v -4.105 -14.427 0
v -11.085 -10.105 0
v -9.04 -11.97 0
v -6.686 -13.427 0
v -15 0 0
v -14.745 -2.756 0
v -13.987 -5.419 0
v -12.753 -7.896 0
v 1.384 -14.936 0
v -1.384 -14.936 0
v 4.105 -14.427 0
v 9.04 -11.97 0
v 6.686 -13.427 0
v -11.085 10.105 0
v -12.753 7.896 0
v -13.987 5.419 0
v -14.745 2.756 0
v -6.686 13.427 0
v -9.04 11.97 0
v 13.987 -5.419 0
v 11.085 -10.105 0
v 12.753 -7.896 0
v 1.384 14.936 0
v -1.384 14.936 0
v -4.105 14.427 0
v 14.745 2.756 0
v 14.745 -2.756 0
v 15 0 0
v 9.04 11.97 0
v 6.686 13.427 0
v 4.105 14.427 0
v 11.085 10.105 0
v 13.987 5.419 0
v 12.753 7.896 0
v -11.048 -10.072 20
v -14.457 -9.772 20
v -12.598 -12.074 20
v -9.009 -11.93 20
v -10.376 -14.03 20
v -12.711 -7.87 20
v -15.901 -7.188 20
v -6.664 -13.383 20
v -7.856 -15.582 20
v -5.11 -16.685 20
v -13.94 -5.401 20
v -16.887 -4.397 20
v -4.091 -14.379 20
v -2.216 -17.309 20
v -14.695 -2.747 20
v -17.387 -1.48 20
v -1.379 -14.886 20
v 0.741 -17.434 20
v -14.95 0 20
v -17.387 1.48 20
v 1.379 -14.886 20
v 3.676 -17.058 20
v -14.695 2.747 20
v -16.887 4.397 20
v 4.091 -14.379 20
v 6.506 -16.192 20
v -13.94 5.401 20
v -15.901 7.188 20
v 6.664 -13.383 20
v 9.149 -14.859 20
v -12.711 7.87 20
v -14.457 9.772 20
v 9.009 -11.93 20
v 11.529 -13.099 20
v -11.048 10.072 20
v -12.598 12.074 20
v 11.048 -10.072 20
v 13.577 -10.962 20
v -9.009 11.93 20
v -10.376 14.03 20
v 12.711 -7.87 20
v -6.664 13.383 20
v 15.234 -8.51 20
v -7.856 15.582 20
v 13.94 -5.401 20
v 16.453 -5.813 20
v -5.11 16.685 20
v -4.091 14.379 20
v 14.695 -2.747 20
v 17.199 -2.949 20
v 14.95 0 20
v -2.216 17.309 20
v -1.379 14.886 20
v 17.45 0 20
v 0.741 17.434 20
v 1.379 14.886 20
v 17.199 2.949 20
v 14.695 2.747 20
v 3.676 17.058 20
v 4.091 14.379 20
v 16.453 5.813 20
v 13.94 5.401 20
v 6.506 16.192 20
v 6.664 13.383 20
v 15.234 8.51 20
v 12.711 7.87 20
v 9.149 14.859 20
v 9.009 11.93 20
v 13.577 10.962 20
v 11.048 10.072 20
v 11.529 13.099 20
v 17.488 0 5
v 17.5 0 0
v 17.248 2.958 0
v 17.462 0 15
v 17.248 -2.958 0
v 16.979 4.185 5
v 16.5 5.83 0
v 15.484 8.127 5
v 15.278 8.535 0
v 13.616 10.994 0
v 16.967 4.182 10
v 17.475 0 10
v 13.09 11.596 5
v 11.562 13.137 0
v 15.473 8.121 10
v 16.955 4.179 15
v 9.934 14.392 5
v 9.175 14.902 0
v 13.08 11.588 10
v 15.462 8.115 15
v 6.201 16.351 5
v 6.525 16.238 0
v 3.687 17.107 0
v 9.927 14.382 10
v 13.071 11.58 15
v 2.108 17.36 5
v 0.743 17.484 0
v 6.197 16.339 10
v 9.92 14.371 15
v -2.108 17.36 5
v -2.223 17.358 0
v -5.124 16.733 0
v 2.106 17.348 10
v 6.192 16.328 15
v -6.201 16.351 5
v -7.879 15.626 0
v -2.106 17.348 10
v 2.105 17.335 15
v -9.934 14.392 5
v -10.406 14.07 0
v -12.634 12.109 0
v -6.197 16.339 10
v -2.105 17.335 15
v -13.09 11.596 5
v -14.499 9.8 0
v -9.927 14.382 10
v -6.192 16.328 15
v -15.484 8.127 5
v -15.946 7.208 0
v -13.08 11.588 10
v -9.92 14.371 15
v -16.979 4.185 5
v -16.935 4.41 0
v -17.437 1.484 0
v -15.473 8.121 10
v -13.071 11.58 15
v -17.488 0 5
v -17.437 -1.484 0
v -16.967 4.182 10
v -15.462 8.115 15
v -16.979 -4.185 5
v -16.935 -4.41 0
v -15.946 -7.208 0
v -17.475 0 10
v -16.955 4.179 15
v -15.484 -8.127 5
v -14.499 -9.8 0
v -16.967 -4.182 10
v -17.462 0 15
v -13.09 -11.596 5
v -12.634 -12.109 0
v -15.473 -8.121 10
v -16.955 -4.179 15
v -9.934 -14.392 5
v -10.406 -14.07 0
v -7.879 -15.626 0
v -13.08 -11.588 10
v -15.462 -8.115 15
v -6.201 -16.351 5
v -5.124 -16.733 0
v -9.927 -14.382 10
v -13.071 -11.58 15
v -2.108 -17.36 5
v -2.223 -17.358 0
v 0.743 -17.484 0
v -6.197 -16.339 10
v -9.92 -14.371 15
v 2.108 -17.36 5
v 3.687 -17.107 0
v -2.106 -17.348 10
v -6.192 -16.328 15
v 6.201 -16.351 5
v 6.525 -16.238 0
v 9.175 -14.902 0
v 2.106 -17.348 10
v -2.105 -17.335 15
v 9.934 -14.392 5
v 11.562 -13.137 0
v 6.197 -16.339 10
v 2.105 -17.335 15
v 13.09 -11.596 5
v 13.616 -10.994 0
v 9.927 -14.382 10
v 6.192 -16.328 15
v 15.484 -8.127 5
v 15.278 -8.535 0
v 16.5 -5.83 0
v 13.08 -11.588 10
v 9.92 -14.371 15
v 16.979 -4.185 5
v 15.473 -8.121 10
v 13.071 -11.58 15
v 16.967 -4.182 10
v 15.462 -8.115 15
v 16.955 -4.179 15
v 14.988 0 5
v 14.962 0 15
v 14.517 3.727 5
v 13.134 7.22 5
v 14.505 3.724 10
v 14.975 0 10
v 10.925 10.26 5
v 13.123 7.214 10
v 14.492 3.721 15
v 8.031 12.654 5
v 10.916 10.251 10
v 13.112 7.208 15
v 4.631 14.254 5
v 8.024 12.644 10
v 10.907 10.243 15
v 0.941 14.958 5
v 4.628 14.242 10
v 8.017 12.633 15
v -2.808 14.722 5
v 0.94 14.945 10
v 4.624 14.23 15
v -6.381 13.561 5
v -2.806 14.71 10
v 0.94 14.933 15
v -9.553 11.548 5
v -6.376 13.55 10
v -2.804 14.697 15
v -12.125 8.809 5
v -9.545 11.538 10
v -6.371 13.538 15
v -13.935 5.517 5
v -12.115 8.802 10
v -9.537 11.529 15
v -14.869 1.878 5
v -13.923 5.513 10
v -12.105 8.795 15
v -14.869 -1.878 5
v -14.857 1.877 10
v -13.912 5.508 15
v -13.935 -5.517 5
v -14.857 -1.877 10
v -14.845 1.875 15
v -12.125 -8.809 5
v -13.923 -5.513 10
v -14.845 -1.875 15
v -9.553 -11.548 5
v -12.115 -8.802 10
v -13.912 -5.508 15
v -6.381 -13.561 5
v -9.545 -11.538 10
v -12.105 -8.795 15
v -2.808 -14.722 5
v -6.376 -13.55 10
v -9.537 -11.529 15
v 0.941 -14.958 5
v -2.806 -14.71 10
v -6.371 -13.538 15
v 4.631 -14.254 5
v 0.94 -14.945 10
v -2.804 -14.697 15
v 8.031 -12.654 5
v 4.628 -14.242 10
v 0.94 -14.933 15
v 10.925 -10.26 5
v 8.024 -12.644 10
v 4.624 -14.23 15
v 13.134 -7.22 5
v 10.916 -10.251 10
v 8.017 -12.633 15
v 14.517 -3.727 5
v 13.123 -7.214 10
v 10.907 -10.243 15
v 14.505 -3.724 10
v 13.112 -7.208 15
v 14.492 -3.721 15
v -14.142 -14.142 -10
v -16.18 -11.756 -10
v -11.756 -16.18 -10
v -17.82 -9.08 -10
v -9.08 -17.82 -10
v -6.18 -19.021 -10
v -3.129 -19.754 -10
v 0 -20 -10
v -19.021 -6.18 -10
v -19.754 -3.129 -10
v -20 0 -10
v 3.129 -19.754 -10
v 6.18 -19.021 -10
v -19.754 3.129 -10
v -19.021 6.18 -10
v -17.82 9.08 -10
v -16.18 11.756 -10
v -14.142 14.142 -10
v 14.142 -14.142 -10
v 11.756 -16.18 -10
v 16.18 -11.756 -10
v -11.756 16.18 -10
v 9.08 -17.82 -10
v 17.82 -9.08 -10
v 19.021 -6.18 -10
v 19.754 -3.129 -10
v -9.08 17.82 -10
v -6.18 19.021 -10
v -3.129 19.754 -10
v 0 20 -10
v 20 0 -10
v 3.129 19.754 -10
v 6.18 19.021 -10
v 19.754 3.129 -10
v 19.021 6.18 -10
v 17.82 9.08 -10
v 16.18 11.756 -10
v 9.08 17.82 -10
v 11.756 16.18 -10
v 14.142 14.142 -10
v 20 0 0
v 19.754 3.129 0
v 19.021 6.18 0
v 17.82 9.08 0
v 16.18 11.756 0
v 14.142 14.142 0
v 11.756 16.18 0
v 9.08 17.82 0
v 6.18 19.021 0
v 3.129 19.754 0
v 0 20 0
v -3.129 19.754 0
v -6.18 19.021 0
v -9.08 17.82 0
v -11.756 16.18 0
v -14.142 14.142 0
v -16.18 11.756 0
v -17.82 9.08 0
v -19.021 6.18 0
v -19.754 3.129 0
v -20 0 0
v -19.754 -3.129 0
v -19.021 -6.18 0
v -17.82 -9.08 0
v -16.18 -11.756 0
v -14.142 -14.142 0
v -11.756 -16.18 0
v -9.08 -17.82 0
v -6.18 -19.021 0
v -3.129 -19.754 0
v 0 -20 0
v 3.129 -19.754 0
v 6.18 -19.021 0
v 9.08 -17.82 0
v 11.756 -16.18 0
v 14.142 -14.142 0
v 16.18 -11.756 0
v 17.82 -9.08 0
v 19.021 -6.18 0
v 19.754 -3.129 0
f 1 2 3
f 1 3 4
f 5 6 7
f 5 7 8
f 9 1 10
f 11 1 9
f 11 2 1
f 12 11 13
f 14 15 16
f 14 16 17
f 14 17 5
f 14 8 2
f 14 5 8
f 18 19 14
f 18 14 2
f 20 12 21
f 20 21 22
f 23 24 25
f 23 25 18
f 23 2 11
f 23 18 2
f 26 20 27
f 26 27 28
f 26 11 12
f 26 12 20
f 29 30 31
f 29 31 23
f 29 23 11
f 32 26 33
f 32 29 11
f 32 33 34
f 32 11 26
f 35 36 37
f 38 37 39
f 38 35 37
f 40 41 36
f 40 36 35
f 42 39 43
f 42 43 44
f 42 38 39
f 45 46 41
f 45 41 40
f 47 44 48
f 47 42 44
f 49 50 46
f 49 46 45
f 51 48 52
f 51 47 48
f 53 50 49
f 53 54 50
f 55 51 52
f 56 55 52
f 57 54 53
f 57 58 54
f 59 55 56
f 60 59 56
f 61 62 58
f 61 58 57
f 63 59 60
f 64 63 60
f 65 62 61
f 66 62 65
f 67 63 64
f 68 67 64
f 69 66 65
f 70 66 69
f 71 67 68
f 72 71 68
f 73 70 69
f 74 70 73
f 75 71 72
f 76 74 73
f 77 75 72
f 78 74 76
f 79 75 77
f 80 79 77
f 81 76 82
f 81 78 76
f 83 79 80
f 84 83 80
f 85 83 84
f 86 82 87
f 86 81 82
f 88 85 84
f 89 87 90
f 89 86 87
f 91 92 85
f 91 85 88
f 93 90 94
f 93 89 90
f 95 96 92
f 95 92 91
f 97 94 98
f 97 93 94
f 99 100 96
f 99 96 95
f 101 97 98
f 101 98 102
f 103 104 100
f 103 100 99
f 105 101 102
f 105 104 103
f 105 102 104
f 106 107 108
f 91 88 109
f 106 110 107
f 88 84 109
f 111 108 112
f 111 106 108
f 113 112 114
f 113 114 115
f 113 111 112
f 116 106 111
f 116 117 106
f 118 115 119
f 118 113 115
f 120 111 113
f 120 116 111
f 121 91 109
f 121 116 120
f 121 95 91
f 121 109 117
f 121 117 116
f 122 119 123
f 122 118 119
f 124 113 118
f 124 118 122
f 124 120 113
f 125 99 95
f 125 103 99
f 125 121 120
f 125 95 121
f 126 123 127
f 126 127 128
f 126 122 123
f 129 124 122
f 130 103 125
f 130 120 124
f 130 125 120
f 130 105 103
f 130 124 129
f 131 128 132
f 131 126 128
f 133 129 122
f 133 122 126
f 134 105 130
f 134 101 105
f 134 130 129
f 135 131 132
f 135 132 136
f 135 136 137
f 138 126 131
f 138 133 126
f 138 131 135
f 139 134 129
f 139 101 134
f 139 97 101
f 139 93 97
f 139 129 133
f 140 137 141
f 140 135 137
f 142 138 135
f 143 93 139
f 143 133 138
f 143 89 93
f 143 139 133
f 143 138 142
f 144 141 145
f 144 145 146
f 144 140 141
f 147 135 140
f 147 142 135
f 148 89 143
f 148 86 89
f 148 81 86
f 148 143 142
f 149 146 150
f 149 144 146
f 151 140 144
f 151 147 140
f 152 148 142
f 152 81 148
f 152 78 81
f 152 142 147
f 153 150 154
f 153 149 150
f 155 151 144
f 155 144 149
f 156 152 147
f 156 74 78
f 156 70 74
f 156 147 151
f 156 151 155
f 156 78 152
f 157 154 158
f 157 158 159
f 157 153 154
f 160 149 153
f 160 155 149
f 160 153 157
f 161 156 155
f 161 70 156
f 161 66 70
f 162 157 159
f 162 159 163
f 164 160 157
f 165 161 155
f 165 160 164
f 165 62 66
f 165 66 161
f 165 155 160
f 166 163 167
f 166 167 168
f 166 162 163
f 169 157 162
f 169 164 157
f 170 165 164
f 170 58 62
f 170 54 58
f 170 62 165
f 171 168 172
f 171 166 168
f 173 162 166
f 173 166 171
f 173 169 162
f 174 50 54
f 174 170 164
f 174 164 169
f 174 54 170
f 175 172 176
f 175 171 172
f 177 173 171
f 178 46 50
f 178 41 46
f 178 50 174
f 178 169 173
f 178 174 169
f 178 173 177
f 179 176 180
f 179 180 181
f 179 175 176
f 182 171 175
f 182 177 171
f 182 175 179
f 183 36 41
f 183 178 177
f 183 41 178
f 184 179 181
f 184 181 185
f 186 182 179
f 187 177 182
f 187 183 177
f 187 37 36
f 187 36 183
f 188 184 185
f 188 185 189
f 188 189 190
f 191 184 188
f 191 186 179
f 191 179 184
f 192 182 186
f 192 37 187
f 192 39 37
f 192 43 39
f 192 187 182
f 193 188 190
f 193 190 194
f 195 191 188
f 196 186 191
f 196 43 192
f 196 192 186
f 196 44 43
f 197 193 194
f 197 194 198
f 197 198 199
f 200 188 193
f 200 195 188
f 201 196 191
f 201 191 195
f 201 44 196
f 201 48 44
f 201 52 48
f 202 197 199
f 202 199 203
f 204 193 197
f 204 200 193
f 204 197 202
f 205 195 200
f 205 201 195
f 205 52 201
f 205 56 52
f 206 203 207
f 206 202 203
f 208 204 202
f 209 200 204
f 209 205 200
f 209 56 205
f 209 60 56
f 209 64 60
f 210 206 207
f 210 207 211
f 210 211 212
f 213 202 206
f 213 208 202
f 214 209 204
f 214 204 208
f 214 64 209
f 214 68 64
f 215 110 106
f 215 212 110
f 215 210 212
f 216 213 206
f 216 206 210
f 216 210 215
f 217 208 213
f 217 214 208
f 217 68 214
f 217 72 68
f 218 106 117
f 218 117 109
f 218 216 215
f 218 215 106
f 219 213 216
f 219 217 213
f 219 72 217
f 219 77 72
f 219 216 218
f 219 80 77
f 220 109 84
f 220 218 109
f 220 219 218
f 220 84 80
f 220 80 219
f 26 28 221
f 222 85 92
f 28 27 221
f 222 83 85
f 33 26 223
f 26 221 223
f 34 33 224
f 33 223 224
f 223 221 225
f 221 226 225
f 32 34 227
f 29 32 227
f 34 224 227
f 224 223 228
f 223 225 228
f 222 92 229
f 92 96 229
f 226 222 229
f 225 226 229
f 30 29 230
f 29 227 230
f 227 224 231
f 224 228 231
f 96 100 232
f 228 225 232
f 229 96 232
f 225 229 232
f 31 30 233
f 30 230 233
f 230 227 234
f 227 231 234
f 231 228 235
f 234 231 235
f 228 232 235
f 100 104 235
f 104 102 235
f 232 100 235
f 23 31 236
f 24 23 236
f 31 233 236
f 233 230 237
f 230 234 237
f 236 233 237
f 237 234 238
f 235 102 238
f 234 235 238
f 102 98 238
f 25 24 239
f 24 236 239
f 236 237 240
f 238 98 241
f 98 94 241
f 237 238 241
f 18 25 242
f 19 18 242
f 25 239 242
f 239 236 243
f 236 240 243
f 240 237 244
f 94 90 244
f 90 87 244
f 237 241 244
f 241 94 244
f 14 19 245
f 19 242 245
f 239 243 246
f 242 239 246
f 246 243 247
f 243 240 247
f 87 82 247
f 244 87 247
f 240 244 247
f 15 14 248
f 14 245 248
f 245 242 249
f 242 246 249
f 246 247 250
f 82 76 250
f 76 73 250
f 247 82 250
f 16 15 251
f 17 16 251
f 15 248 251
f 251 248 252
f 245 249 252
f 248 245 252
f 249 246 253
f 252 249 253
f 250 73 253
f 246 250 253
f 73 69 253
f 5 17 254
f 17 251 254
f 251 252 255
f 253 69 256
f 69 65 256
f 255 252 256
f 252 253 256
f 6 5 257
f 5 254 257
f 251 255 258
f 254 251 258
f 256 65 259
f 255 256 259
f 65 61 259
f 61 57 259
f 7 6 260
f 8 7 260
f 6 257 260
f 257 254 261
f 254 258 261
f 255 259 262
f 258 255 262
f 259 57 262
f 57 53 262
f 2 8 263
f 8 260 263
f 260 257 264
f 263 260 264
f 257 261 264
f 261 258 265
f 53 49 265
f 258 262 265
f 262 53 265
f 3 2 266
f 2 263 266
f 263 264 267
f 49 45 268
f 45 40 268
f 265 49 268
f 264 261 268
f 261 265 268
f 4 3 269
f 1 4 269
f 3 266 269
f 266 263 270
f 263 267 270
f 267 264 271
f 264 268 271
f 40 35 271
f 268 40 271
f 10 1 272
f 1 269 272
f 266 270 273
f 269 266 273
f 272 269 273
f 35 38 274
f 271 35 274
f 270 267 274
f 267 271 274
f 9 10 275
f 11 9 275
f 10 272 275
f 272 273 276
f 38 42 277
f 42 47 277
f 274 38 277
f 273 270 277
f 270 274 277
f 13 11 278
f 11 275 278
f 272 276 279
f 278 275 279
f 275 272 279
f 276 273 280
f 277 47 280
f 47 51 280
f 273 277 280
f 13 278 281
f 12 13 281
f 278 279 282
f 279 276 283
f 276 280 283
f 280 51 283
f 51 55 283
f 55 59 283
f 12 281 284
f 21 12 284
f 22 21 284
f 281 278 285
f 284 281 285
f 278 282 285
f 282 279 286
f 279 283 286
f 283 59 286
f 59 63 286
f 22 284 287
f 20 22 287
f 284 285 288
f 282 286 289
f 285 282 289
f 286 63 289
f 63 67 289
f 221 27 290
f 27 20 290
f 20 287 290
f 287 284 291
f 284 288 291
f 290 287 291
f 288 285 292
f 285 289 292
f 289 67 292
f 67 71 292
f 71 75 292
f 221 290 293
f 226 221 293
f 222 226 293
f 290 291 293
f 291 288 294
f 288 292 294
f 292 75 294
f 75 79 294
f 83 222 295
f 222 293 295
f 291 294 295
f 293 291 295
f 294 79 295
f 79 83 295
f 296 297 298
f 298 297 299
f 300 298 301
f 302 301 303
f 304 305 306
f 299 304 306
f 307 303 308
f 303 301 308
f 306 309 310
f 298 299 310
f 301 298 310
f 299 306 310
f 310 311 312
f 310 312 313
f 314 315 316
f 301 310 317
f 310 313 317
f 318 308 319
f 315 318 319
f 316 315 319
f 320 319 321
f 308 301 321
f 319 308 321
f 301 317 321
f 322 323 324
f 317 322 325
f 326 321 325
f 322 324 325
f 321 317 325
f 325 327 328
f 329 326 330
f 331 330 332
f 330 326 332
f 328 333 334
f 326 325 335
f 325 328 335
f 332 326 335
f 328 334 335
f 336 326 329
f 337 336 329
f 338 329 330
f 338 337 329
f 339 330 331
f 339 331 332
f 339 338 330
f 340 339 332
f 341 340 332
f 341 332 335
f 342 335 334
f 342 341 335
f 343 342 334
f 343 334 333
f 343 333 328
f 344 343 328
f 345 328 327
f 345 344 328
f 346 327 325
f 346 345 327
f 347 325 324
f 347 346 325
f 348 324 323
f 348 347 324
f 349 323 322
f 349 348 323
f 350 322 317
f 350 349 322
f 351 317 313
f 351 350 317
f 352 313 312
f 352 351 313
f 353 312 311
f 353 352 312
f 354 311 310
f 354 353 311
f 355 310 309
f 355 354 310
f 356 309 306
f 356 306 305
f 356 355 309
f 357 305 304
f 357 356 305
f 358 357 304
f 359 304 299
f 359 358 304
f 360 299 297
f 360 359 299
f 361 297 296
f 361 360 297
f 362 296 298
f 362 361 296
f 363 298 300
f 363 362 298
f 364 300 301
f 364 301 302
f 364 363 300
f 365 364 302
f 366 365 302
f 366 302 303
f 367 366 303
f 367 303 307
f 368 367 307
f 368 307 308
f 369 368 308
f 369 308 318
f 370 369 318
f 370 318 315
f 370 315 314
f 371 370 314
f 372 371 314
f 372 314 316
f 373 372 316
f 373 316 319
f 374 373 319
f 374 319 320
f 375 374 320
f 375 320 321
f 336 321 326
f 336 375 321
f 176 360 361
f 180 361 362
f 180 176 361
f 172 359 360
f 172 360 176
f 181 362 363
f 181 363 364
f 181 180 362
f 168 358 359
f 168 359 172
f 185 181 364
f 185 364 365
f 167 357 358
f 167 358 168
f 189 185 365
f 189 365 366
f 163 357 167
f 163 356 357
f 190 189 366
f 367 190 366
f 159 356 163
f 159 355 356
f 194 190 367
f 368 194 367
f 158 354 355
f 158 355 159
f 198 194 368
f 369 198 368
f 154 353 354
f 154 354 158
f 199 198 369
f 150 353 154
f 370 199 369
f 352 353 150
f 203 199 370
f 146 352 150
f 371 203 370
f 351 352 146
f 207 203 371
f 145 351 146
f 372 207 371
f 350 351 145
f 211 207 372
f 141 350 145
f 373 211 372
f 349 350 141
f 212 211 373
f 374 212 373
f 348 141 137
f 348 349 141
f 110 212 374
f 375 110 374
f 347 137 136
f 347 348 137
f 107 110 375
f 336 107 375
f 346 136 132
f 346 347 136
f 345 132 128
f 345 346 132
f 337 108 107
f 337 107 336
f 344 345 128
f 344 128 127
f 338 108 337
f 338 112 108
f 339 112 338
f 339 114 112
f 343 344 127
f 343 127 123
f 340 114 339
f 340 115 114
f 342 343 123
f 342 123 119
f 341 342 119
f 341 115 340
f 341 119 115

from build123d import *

# Parameters (mm, degrees)
SKETCH_R    = 20
PAD_DEPTH   = 10
SKETCH001_R = 17.5
SKETCH002_R = 17.45
SKETCH003_R = 15
SKETCH004_R = 14.95


with BuildPart() as part:
    # Sketch → Pad (new body)
    with BuildSketch(Plane.XY):
        Circle(SKETCH_R)
    extrude(amount=-PAD_DEPTH)

    # Sketch001 → AdditiveLoft section 0
    with BuildSketch(Plane.XY):
        Circle(SKETCH001_R)
    # Sketch002 (on DatumPlane) → AdditiveLoft section 1
    with BuildSketch(Plane.XY.offset(20)):
        Circle(SKETCH002_R)
    loft()

    # Sketch003 → SubtractiveLoft section 0
    with BuildSketch(Plane.XY):
        Circle(SKETCH003_R)
    # Sketch004 (on DatumPlane) → SubtractiveLoft section 1
    with BuildSketch(Plane.XY.offset(20)):
        Circle(SKETCH004_R)
    loft(mode=Mode.SUBTRACT)


solid = part.part
